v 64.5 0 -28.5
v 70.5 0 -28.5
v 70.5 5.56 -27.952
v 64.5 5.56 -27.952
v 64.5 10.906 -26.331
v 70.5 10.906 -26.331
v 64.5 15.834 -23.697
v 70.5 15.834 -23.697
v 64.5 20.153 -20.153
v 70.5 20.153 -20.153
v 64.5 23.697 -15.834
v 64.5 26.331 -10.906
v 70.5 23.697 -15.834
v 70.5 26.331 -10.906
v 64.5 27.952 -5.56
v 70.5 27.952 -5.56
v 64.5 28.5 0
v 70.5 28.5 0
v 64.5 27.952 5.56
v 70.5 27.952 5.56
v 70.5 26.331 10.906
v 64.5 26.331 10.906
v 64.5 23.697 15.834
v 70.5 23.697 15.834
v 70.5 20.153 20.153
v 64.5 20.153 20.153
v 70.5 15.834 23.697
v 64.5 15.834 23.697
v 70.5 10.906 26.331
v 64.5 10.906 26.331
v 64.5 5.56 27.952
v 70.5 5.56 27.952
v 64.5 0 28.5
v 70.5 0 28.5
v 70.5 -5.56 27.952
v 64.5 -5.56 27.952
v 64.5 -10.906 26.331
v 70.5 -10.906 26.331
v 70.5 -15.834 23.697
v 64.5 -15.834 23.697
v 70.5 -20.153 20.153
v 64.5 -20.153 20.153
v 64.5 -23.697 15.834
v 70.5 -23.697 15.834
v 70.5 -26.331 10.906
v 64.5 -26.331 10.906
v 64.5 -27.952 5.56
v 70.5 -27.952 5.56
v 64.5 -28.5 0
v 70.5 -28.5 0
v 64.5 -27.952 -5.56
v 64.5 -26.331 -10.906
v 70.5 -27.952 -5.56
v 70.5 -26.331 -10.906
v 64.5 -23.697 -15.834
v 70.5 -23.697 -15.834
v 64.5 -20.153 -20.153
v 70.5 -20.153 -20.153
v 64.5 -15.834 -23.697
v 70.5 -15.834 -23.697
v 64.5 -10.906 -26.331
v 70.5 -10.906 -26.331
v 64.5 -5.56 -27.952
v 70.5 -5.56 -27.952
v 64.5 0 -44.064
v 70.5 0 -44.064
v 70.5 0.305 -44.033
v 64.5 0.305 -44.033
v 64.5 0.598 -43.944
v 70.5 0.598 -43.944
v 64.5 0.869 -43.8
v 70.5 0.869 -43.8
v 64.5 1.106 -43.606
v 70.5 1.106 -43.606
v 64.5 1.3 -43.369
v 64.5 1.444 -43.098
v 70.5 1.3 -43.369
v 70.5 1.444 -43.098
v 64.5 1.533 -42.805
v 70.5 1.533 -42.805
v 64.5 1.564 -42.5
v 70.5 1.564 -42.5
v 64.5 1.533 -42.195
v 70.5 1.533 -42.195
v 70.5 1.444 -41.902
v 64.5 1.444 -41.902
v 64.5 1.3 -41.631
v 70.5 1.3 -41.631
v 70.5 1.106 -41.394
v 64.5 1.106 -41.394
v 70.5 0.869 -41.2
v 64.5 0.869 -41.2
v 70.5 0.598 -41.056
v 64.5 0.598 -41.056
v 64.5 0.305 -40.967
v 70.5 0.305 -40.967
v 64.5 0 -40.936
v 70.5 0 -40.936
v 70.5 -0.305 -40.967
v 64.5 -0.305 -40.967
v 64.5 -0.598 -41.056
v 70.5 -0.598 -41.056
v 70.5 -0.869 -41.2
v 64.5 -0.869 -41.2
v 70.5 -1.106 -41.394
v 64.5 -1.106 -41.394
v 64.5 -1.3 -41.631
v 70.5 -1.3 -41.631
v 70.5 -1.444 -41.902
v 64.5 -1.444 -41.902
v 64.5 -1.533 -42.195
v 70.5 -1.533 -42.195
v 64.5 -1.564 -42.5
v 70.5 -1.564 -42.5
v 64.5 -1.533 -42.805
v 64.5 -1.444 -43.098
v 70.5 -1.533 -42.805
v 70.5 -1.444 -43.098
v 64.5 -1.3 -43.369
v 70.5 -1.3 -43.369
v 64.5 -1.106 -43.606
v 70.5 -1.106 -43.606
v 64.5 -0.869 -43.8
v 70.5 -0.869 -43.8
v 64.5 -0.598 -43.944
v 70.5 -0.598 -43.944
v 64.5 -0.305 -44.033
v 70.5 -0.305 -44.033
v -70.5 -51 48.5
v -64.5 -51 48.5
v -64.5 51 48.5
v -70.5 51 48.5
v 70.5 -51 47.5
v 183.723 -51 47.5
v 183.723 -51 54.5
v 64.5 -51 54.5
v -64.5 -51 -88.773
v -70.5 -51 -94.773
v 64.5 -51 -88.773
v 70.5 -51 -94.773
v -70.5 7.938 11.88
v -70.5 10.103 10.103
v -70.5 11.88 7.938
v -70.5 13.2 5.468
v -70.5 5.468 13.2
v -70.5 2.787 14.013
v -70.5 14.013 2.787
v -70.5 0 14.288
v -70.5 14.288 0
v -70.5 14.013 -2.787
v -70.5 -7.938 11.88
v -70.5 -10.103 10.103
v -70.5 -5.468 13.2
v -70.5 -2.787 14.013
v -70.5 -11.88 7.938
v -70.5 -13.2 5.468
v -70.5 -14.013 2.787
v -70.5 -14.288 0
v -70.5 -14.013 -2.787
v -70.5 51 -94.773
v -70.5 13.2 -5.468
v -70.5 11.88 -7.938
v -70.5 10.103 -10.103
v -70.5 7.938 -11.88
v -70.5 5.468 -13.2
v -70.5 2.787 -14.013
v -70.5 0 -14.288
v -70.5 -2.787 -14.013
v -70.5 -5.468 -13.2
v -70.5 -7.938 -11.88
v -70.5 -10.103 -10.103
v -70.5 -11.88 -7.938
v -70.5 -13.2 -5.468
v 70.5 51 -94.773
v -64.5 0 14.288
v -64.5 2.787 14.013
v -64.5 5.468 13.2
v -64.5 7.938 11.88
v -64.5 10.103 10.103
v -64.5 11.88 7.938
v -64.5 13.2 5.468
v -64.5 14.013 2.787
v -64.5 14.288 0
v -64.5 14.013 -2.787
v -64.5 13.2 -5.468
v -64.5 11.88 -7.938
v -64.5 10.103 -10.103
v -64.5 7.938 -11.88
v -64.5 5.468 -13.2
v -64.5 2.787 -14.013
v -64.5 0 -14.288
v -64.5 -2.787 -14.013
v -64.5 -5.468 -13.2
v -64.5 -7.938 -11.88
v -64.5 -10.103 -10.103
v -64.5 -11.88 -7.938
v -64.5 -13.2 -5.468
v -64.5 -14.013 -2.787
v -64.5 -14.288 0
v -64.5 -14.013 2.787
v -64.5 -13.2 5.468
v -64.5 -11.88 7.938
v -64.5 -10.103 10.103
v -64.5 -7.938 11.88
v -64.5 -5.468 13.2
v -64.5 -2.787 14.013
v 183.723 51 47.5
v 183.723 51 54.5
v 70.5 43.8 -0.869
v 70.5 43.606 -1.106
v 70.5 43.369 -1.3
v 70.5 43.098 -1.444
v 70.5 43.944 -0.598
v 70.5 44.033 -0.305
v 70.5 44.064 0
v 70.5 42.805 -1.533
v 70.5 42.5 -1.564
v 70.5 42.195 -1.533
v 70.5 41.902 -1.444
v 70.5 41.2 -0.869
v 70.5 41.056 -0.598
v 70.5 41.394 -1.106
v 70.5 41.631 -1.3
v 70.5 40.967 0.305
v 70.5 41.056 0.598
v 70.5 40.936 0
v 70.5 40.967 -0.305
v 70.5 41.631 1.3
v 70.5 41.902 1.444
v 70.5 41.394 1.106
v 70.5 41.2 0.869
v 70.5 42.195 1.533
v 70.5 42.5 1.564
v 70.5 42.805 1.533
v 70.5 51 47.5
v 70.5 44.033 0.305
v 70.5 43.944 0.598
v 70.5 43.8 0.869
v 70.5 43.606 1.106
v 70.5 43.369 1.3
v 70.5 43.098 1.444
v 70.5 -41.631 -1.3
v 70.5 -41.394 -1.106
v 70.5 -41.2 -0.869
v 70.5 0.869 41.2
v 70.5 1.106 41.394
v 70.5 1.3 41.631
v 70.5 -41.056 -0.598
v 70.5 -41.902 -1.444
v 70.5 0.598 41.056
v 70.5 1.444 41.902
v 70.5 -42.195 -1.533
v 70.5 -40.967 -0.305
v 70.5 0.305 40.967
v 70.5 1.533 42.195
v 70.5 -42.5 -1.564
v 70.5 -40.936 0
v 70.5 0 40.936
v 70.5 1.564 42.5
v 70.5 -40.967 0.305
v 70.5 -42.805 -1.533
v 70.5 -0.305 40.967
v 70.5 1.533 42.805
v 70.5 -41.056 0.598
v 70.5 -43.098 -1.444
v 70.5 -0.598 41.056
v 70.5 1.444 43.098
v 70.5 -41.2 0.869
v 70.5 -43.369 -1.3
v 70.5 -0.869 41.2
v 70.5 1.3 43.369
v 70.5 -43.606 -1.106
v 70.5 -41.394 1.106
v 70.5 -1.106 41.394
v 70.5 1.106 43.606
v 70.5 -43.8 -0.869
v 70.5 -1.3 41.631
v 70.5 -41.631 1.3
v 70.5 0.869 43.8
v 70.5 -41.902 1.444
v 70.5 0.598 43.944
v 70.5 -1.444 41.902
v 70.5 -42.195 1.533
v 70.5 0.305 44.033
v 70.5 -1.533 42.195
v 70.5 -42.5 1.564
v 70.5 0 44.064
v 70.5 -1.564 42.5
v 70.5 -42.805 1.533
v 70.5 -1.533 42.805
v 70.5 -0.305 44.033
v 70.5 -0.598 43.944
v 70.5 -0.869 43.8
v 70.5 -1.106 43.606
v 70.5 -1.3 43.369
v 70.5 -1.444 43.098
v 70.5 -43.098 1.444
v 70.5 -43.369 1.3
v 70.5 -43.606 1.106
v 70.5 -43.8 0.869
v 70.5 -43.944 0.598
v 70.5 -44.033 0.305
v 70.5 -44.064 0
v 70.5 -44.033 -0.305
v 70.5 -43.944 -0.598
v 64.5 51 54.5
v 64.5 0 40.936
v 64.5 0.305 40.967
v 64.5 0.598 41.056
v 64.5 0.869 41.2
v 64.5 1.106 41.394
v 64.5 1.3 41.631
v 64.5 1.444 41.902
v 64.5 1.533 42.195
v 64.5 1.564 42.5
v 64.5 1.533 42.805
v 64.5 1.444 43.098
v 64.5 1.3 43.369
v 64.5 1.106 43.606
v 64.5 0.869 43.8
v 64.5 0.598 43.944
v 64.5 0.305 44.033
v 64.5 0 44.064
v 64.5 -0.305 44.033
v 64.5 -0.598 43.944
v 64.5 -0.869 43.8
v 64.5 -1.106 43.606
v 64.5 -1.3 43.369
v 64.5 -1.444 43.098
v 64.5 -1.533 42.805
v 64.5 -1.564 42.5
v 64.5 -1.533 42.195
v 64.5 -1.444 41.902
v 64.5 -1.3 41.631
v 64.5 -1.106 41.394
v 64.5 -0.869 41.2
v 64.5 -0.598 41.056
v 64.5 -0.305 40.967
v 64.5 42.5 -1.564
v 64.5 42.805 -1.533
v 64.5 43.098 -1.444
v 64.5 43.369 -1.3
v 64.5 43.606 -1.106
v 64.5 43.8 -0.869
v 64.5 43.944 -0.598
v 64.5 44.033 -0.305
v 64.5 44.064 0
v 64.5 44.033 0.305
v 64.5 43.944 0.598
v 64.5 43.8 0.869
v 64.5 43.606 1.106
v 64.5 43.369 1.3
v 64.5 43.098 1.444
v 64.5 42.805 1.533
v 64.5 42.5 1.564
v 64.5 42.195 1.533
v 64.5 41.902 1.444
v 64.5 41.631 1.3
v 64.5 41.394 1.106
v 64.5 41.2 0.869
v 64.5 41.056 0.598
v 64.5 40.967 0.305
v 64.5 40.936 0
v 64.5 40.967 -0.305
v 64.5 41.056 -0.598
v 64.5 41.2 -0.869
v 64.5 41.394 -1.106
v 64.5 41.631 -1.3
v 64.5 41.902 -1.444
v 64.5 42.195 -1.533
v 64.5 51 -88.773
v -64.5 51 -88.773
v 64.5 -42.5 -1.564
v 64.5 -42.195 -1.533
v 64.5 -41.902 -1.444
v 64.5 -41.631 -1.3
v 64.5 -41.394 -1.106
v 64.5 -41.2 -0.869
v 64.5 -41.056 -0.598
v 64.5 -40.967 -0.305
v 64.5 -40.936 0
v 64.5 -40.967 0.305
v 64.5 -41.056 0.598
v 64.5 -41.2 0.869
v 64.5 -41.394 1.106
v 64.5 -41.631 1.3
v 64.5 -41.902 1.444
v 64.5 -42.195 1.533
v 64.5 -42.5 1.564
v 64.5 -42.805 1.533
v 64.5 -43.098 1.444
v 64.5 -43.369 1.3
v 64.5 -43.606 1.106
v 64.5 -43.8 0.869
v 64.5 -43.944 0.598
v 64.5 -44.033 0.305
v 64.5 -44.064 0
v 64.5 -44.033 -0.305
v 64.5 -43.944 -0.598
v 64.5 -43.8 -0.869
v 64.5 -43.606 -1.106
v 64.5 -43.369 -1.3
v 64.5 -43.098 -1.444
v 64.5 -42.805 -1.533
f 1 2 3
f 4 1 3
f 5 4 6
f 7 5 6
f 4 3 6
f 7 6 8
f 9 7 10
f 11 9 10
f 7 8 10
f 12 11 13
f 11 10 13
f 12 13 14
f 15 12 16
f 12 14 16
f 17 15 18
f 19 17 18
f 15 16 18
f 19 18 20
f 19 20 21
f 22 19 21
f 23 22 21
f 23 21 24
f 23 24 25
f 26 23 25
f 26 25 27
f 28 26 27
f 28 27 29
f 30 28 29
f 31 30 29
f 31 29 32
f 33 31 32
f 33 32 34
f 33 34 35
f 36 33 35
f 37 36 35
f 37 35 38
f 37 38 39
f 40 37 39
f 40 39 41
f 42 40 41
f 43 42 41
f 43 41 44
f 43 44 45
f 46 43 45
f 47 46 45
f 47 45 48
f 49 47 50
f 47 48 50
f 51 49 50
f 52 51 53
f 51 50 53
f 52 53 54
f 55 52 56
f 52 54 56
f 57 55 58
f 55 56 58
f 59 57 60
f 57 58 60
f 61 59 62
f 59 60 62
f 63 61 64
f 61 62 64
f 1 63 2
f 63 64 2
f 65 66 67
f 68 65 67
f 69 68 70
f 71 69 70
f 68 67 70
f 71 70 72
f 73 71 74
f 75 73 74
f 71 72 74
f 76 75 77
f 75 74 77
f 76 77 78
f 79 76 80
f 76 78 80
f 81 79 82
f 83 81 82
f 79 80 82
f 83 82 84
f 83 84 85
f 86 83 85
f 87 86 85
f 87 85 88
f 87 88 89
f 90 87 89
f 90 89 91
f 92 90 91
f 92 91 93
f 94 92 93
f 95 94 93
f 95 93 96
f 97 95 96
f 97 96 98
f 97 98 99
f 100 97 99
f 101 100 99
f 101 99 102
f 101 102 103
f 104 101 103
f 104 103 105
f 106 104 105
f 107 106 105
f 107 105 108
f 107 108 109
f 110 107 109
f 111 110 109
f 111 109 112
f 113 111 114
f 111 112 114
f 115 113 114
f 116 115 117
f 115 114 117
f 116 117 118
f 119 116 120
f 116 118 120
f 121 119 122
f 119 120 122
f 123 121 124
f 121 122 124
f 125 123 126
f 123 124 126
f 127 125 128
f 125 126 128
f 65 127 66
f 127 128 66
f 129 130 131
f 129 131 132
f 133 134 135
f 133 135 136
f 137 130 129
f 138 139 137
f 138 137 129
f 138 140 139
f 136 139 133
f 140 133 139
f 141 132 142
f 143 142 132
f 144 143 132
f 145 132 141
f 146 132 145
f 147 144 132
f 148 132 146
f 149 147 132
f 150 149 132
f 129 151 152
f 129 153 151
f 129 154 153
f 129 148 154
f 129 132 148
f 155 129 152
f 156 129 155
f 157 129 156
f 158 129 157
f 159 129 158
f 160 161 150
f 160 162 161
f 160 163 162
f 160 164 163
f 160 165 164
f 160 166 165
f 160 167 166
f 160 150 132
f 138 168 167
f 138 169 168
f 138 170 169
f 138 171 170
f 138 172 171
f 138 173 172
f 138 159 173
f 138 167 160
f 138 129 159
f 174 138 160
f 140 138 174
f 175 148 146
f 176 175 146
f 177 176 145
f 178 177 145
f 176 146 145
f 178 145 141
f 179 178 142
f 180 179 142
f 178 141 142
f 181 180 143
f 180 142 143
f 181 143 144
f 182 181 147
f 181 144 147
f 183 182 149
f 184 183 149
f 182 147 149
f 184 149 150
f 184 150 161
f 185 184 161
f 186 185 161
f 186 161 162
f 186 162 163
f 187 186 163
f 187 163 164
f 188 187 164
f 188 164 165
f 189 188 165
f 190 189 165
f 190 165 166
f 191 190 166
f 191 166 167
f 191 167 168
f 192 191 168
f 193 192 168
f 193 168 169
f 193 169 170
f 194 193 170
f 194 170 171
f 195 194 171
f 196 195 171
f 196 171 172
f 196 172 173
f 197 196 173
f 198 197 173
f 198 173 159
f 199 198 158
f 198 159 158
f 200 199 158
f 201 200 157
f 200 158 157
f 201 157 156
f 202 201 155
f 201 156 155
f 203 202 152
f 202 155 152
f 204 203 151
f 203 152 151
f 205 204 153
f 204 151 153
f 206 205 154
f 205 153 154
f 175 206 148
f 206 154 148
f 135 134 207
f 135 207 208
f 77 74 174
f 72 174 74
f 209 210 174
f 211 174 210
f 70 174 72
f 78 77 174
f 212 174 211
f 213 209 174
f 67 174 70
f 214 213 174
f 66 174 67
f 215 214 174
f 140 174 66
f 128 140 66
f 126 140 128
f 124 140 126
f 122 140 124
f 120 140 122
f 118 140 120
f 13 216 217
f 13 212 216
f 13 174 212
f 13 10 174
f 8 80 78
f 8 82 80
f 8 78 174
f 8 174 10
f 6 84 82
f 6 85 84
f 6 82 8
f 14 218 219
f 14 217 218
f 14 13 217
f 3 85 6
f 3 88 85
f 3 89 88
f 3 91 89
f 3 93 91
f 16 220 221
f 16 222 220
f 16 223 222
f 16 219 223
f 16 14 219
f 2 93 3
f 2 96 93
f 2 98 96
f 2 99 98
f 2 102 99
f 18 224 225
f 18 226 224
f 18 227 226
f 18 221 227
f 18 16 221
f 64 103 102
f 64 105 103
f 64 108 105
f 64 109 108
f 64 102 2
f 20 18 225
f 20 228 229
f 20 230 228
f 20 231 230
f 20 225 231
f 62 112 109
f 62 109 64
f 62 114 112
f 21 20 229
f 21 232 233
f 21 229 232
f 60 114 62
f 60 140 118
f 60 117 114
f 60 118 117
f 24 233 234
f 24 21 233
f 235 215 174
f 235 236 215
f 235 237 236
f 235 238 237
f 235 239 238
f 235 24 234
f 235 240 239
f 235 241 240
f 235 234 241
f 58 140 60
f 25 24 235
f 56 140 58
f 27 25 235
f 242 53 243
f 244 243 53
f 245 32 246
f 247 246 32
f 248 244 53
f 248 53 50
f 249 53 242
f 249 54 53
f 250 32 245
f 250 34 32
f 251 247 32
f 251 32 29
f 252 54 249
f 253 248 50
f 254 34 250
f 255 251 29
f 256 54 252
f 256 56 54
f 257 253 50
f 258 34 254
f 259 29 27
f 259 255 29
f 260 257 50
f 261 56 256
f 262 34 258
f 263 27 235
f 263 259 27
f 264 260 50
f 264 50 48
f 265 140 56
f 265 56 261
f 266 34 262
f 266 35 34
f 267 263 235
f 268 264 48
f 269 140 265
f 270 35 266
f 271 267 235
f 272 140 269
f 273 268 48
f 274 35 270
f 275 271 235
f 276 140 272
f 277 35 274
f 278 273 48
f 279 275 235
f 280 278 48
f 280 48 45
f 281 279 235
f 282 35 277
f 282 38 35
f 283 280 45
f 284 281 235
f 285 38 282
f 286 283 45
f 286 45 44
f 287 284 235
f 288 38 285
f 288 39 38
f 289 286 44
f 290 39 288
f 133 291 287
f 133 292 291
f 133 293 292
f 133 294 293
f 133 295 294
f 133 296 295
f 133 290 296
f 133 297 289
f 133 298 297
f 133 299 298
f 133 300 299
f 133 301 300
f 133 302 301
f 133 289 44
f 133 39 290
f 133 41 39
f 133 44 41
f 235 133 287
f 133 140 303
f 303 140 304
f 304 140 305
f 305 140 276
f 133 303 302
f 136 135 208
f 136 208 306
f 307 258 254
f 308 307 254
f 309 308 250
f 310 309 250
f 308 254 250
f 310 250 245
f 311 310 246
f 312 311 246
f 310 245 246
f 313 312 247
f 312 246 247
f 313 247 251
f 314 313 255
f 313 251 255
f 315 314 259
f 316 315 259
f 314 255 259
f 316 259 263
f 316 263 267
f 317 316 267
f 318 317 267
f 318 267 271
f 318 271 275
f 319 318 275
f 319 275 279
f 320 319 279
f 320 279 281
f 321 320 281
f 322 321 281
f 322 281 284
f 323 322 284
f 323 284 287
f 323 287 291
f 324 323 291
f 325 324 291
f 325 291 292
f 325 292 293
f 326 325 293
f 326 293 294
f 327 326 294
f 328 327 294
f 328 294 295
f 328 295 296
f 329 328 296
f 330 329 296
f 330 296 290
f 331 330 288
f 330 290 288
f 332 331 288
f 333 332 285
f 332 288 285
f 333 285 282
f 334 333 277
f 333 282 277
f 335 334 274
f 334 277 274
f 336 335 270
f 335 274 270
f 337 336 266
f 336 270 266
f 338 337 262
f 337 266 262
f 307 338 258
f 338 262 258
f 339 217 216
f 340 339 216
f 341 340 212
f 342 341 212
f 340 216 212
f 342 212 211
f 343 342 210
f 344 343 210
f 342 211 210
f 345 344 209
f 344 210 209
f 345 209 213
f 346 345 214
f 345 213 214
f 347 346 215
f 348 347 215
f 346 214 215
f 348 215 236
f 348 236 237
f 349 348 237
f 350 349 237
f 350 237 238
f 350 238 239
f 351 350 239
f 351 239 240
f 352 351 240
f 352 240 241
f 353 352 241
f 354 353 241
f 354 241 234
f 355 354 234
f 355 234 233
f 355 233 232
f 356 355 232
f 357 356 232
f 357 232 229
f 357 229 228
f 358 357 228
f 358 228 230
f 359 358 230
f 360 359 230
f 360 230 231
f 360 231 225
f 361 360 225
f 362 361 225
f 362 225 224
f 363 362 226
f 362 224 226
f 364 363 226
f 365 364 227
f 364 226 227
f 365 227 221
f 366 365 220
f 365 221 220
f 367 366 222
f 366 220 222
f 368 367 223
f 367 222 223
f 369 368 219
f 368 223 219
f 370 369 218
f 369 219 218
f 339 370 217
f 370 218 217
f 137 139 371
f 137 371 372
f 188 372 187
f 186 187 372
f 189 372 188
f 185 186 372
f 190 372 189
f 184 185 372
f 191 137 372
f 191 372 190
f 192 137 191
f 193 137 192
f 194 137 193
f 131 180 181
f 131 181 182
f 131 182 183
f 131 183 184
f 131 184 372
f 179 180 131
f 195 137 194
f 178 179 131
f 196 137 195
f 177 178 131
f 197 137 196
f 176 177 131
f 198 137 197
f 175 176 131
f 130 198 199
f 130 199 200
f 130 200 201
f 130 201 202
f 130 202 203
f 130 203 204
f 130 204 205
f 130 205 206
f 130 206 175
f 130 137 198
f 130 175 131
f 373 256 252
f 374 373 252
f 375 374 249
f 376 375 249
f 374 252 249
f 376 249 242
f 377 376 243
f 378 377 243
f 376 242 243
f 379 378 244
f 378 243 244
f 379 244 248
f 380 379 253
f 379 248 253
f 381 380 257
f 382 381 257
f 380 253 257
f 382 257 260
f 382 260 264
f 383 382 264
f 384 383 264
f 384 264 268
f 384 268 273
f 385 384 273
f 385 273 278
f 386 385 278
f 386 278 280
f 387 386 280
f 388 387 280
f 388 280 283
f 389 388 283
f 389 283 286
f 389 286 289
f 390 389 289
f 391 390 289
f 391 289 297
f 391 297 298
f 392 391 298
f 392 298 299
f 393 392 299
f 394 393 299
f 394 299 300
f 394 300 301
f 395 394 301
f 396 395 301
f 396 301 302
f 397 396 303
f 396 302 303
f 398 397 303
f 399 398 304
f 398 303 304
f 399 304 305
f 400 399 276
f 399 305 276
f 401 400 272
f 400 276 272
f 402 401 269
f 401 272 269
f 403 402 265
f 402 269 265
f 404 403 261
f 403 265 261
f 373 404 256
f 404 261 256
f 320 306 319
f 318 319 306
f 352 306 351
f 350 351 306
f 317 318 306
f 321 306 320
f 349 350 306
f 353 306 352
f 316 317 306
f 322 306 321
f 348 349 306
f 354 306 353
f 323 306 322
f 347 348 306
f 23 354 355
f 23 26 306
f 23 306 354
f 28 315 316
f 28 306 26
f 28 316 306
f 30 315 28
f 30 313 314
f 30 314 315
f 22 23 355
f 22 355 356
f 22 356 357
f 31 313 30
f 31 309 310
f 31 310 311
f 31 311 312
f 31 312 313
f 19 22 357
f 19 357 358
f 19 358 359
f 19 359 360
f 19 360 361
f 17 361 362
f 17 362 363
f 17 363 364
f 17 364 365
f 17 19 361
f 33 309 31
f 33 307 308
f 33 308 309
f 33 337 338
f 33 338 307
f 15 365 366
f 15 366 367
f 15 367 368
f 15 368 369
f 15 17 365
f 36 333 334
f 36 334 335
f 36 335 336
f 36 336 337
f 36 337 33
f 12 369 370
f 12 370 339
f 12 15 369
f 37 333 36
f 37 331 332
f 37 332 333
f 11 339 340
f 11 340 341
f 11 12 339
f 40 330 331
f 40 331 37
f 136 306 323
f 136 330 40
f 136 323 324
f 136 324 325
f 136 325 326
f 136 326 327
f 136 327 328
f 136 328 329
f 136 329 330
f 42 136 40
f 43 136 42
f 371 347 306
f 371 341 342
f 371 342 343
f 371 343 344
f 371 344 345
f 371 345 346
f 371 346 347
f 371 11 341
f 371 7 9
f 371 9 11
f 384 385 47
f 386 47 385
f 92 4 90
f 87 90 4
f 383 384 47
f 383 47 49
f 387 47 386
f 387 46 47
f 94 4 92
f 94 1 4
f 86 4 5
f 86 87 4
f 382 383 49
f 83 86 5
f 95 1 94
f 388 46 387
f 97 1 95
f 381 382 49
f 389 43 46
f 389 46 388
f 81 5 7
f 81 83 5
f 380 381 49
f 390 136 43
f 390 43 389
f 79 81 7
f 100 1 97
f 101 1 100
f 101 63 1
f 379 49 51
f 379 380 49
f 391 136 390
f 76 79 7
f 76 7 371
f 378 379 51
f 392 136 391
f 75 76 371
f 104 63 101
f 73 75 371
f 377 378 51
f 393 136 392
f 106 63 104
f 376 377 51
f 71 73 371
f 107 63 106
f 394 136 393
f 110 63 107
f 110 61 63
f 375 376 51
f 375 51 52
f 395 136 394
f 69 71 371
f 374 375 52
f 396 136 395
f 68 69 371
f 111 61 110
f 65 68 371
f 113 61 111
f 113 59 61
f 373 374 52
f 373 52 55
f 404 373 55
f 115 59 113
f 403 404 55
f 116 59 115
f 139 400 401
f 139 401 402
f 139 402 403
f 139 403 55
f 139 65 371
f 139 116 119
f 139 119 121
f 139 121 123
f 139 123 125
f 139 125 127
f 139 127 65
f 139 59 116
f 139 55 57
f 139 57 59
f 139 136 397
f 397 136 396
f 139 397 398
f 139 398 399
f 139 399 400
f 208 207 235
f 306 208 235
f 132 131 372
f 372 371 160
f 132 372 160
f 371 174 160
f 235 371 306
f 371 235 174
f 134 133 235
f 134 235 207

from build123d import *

# Parameters (mm, degrees)
BOSS_EXTRUDE3_DEPTH      = 51
BOSS_EXTRUDE3_DEPTH_BACK = 51
CUT_EXTRUDE3_REACH       = 179.381
SKETCH7_R                = 1.5635
SKETCH7_R_2              = 28.5
CUT_EXTRUDE4_REACH       = 278.066
SKETCH8_R                = 14.2875


with BuildPart() as part:
    # Sketch6 → Boss-Extrude3 (new, two sides: drawn at the far end of the back side and taken through both)
    with BuildSketch(Plane(origin=(0, 0, 0), x_dir=(1, 0, 0), z_dir=(0, 1, 0)).offset(-BOSS_EXTRUDE3_DEPTH_BACK)):
        Polygon((183.723, -47.5), (183.723, -54.5), (64.5, -54.5), (64.5, 88.773061806), (-64.5, 88.773061806), (-64.5, -48.5), (-70.5, -48.5), (-70.5, 94.773061806), (70.5, 94.773061806), (70.5, -47.5), align=None)
    extrude(amount=BOSS_EXTRUDE3_DEPTH + BOSS_EXTRUDE3_DEPTH_BACK)

    # Sketch7 → Cut-Extrude3 (cut, up to next)
    with BuildSketch(Plane(origin=(70.5, 0, 0), x_dir=(0, 0, -1), z_dir=(1, 0, 0)), mode=Mode.PRIVATE) as cut_extrude3_sk1:
        with Locations((0, 42.5)):
            Circle(SKETCH7_R)
    cut_extrude3_tool1 = extrude(cut_extrude3_sk1.sketch, amount=-CUT_EXTRUDE3_REACH, mode=Mode.PRIVATE) & part.part
    # Sketch7 → Cut-Extrude3 (cut, up to next)
    with BuildSketch(Plane(origin=(70.5, 0, 0), x_dir=(0, 0, -1), z_dir=(1, 0, 0)), mode=Mode.PRIVATE) as cut_extrude3_sk2:
        with Locations((42.5, 0)):
            Circle(SKETCH7_R)
    cut_extrude3_tool2 = extrude(cut_extrude3_sk2.sketch, amount=-CUT_EXTRUDE3_REACH, mode=Mode.PRIVATE) & part.part
    # Sketch7 → Cut-Extrude3 (cut, up to next)
    with BuildSketch(Plane(origin=(70.5, 0, 0), x_dir=(0, 0, -1), z_dir=(1, 0, 0)), mode=Mode.PRIVATE) as cut_extrude3_sk3:
        with Locations((0, -42.5)):
            Circle(SKETCH7_R)
    cut_extrude3_tool3 = extrude(cut_extrude3_sk3.sketch, amount=-CUT_EXTRUDE3_REACH, mode=Mode.PRIVATE) & part.part
    # Sketch7 → Cut-Extrude3 (cut, up to next)
    with BuildSketch(Plane(origin=(70.5, 0, 0), x_dir=(0, 0, -1), z_dir=(1, 0, 0)), mode=Mode.PRIVATE) as cut_extrude3_sk4:
        with Locations((-42.5, 0)):
            Circle(SKETCH7_R)
    cut_extrude3_tool4 = extrude(cut_extrude3_sk4.sketch, amount=-CUT_EXTRUDE3_REACH, mode=Mode.PRIVATE) & part.part
    # Sketch7 → Cut-Extrude3 (cut, up to next)
    with BuildSketch(Plane(origin=(70.5, 0, 0), x_dir=(0, 0, -1), z_dir=(1, 0, 0)), mode=Mode.PRIVATE) as cut_extrude3_sk5:
        Circle(SKETCH7_R_2)
    cut_extrude3_tool5 = extrude(cut_extrude3_sk5.sketch, amount=-CUT_EXTRUDE3_REACH, mode=Mode.PRIVATE) & part.part
    add(cut_extrude3_tool1.solids().sort_by_distance((70.5, 42.5, 0))[0], mode=Mode.SUBTRACT)
    add(cut_extrude3_tool2.solids().sort_by_distance((70.5, 0, -42.5))[0], mode=Mode.SUBTRACT)
    add(cut_extrude3_tool3.solids().sort_by_distance((70.5, -42.5, 0))[0], mode=Mode.SUBTRACT)
    add(cut_extrude3_tool4.solids().sort_by_distance((70.5, 0, 42.5))[0], mode=Mode.SUBTRACT)
    add(cut_extrude3_tool5.solids().sort_by_distance((70.5, 0, 0))[0], mode=Mode.SUBTRACT)

    # Sketch8 → Cut-Extrude4 (cut, up to next)
    with BuildSketch(Plane.ZY.offset(70.5), mode=Mode.PRIVATE) as cut_extrude4_sk1:
        Circle(SKETCH8_R)
    cut_extrude4_tool1 = extrude(cut_extrude4_sk1.sketch, amount=-CUT_EXTRUDE4_REACH, mode=Mode.PRIVATE) & part.part
    add(cut_extrude4_tool1.solids().sort_by_distance((-70.5, 0, 0))[0], mode=Mode.SUBTRACT)


solid = part.part
